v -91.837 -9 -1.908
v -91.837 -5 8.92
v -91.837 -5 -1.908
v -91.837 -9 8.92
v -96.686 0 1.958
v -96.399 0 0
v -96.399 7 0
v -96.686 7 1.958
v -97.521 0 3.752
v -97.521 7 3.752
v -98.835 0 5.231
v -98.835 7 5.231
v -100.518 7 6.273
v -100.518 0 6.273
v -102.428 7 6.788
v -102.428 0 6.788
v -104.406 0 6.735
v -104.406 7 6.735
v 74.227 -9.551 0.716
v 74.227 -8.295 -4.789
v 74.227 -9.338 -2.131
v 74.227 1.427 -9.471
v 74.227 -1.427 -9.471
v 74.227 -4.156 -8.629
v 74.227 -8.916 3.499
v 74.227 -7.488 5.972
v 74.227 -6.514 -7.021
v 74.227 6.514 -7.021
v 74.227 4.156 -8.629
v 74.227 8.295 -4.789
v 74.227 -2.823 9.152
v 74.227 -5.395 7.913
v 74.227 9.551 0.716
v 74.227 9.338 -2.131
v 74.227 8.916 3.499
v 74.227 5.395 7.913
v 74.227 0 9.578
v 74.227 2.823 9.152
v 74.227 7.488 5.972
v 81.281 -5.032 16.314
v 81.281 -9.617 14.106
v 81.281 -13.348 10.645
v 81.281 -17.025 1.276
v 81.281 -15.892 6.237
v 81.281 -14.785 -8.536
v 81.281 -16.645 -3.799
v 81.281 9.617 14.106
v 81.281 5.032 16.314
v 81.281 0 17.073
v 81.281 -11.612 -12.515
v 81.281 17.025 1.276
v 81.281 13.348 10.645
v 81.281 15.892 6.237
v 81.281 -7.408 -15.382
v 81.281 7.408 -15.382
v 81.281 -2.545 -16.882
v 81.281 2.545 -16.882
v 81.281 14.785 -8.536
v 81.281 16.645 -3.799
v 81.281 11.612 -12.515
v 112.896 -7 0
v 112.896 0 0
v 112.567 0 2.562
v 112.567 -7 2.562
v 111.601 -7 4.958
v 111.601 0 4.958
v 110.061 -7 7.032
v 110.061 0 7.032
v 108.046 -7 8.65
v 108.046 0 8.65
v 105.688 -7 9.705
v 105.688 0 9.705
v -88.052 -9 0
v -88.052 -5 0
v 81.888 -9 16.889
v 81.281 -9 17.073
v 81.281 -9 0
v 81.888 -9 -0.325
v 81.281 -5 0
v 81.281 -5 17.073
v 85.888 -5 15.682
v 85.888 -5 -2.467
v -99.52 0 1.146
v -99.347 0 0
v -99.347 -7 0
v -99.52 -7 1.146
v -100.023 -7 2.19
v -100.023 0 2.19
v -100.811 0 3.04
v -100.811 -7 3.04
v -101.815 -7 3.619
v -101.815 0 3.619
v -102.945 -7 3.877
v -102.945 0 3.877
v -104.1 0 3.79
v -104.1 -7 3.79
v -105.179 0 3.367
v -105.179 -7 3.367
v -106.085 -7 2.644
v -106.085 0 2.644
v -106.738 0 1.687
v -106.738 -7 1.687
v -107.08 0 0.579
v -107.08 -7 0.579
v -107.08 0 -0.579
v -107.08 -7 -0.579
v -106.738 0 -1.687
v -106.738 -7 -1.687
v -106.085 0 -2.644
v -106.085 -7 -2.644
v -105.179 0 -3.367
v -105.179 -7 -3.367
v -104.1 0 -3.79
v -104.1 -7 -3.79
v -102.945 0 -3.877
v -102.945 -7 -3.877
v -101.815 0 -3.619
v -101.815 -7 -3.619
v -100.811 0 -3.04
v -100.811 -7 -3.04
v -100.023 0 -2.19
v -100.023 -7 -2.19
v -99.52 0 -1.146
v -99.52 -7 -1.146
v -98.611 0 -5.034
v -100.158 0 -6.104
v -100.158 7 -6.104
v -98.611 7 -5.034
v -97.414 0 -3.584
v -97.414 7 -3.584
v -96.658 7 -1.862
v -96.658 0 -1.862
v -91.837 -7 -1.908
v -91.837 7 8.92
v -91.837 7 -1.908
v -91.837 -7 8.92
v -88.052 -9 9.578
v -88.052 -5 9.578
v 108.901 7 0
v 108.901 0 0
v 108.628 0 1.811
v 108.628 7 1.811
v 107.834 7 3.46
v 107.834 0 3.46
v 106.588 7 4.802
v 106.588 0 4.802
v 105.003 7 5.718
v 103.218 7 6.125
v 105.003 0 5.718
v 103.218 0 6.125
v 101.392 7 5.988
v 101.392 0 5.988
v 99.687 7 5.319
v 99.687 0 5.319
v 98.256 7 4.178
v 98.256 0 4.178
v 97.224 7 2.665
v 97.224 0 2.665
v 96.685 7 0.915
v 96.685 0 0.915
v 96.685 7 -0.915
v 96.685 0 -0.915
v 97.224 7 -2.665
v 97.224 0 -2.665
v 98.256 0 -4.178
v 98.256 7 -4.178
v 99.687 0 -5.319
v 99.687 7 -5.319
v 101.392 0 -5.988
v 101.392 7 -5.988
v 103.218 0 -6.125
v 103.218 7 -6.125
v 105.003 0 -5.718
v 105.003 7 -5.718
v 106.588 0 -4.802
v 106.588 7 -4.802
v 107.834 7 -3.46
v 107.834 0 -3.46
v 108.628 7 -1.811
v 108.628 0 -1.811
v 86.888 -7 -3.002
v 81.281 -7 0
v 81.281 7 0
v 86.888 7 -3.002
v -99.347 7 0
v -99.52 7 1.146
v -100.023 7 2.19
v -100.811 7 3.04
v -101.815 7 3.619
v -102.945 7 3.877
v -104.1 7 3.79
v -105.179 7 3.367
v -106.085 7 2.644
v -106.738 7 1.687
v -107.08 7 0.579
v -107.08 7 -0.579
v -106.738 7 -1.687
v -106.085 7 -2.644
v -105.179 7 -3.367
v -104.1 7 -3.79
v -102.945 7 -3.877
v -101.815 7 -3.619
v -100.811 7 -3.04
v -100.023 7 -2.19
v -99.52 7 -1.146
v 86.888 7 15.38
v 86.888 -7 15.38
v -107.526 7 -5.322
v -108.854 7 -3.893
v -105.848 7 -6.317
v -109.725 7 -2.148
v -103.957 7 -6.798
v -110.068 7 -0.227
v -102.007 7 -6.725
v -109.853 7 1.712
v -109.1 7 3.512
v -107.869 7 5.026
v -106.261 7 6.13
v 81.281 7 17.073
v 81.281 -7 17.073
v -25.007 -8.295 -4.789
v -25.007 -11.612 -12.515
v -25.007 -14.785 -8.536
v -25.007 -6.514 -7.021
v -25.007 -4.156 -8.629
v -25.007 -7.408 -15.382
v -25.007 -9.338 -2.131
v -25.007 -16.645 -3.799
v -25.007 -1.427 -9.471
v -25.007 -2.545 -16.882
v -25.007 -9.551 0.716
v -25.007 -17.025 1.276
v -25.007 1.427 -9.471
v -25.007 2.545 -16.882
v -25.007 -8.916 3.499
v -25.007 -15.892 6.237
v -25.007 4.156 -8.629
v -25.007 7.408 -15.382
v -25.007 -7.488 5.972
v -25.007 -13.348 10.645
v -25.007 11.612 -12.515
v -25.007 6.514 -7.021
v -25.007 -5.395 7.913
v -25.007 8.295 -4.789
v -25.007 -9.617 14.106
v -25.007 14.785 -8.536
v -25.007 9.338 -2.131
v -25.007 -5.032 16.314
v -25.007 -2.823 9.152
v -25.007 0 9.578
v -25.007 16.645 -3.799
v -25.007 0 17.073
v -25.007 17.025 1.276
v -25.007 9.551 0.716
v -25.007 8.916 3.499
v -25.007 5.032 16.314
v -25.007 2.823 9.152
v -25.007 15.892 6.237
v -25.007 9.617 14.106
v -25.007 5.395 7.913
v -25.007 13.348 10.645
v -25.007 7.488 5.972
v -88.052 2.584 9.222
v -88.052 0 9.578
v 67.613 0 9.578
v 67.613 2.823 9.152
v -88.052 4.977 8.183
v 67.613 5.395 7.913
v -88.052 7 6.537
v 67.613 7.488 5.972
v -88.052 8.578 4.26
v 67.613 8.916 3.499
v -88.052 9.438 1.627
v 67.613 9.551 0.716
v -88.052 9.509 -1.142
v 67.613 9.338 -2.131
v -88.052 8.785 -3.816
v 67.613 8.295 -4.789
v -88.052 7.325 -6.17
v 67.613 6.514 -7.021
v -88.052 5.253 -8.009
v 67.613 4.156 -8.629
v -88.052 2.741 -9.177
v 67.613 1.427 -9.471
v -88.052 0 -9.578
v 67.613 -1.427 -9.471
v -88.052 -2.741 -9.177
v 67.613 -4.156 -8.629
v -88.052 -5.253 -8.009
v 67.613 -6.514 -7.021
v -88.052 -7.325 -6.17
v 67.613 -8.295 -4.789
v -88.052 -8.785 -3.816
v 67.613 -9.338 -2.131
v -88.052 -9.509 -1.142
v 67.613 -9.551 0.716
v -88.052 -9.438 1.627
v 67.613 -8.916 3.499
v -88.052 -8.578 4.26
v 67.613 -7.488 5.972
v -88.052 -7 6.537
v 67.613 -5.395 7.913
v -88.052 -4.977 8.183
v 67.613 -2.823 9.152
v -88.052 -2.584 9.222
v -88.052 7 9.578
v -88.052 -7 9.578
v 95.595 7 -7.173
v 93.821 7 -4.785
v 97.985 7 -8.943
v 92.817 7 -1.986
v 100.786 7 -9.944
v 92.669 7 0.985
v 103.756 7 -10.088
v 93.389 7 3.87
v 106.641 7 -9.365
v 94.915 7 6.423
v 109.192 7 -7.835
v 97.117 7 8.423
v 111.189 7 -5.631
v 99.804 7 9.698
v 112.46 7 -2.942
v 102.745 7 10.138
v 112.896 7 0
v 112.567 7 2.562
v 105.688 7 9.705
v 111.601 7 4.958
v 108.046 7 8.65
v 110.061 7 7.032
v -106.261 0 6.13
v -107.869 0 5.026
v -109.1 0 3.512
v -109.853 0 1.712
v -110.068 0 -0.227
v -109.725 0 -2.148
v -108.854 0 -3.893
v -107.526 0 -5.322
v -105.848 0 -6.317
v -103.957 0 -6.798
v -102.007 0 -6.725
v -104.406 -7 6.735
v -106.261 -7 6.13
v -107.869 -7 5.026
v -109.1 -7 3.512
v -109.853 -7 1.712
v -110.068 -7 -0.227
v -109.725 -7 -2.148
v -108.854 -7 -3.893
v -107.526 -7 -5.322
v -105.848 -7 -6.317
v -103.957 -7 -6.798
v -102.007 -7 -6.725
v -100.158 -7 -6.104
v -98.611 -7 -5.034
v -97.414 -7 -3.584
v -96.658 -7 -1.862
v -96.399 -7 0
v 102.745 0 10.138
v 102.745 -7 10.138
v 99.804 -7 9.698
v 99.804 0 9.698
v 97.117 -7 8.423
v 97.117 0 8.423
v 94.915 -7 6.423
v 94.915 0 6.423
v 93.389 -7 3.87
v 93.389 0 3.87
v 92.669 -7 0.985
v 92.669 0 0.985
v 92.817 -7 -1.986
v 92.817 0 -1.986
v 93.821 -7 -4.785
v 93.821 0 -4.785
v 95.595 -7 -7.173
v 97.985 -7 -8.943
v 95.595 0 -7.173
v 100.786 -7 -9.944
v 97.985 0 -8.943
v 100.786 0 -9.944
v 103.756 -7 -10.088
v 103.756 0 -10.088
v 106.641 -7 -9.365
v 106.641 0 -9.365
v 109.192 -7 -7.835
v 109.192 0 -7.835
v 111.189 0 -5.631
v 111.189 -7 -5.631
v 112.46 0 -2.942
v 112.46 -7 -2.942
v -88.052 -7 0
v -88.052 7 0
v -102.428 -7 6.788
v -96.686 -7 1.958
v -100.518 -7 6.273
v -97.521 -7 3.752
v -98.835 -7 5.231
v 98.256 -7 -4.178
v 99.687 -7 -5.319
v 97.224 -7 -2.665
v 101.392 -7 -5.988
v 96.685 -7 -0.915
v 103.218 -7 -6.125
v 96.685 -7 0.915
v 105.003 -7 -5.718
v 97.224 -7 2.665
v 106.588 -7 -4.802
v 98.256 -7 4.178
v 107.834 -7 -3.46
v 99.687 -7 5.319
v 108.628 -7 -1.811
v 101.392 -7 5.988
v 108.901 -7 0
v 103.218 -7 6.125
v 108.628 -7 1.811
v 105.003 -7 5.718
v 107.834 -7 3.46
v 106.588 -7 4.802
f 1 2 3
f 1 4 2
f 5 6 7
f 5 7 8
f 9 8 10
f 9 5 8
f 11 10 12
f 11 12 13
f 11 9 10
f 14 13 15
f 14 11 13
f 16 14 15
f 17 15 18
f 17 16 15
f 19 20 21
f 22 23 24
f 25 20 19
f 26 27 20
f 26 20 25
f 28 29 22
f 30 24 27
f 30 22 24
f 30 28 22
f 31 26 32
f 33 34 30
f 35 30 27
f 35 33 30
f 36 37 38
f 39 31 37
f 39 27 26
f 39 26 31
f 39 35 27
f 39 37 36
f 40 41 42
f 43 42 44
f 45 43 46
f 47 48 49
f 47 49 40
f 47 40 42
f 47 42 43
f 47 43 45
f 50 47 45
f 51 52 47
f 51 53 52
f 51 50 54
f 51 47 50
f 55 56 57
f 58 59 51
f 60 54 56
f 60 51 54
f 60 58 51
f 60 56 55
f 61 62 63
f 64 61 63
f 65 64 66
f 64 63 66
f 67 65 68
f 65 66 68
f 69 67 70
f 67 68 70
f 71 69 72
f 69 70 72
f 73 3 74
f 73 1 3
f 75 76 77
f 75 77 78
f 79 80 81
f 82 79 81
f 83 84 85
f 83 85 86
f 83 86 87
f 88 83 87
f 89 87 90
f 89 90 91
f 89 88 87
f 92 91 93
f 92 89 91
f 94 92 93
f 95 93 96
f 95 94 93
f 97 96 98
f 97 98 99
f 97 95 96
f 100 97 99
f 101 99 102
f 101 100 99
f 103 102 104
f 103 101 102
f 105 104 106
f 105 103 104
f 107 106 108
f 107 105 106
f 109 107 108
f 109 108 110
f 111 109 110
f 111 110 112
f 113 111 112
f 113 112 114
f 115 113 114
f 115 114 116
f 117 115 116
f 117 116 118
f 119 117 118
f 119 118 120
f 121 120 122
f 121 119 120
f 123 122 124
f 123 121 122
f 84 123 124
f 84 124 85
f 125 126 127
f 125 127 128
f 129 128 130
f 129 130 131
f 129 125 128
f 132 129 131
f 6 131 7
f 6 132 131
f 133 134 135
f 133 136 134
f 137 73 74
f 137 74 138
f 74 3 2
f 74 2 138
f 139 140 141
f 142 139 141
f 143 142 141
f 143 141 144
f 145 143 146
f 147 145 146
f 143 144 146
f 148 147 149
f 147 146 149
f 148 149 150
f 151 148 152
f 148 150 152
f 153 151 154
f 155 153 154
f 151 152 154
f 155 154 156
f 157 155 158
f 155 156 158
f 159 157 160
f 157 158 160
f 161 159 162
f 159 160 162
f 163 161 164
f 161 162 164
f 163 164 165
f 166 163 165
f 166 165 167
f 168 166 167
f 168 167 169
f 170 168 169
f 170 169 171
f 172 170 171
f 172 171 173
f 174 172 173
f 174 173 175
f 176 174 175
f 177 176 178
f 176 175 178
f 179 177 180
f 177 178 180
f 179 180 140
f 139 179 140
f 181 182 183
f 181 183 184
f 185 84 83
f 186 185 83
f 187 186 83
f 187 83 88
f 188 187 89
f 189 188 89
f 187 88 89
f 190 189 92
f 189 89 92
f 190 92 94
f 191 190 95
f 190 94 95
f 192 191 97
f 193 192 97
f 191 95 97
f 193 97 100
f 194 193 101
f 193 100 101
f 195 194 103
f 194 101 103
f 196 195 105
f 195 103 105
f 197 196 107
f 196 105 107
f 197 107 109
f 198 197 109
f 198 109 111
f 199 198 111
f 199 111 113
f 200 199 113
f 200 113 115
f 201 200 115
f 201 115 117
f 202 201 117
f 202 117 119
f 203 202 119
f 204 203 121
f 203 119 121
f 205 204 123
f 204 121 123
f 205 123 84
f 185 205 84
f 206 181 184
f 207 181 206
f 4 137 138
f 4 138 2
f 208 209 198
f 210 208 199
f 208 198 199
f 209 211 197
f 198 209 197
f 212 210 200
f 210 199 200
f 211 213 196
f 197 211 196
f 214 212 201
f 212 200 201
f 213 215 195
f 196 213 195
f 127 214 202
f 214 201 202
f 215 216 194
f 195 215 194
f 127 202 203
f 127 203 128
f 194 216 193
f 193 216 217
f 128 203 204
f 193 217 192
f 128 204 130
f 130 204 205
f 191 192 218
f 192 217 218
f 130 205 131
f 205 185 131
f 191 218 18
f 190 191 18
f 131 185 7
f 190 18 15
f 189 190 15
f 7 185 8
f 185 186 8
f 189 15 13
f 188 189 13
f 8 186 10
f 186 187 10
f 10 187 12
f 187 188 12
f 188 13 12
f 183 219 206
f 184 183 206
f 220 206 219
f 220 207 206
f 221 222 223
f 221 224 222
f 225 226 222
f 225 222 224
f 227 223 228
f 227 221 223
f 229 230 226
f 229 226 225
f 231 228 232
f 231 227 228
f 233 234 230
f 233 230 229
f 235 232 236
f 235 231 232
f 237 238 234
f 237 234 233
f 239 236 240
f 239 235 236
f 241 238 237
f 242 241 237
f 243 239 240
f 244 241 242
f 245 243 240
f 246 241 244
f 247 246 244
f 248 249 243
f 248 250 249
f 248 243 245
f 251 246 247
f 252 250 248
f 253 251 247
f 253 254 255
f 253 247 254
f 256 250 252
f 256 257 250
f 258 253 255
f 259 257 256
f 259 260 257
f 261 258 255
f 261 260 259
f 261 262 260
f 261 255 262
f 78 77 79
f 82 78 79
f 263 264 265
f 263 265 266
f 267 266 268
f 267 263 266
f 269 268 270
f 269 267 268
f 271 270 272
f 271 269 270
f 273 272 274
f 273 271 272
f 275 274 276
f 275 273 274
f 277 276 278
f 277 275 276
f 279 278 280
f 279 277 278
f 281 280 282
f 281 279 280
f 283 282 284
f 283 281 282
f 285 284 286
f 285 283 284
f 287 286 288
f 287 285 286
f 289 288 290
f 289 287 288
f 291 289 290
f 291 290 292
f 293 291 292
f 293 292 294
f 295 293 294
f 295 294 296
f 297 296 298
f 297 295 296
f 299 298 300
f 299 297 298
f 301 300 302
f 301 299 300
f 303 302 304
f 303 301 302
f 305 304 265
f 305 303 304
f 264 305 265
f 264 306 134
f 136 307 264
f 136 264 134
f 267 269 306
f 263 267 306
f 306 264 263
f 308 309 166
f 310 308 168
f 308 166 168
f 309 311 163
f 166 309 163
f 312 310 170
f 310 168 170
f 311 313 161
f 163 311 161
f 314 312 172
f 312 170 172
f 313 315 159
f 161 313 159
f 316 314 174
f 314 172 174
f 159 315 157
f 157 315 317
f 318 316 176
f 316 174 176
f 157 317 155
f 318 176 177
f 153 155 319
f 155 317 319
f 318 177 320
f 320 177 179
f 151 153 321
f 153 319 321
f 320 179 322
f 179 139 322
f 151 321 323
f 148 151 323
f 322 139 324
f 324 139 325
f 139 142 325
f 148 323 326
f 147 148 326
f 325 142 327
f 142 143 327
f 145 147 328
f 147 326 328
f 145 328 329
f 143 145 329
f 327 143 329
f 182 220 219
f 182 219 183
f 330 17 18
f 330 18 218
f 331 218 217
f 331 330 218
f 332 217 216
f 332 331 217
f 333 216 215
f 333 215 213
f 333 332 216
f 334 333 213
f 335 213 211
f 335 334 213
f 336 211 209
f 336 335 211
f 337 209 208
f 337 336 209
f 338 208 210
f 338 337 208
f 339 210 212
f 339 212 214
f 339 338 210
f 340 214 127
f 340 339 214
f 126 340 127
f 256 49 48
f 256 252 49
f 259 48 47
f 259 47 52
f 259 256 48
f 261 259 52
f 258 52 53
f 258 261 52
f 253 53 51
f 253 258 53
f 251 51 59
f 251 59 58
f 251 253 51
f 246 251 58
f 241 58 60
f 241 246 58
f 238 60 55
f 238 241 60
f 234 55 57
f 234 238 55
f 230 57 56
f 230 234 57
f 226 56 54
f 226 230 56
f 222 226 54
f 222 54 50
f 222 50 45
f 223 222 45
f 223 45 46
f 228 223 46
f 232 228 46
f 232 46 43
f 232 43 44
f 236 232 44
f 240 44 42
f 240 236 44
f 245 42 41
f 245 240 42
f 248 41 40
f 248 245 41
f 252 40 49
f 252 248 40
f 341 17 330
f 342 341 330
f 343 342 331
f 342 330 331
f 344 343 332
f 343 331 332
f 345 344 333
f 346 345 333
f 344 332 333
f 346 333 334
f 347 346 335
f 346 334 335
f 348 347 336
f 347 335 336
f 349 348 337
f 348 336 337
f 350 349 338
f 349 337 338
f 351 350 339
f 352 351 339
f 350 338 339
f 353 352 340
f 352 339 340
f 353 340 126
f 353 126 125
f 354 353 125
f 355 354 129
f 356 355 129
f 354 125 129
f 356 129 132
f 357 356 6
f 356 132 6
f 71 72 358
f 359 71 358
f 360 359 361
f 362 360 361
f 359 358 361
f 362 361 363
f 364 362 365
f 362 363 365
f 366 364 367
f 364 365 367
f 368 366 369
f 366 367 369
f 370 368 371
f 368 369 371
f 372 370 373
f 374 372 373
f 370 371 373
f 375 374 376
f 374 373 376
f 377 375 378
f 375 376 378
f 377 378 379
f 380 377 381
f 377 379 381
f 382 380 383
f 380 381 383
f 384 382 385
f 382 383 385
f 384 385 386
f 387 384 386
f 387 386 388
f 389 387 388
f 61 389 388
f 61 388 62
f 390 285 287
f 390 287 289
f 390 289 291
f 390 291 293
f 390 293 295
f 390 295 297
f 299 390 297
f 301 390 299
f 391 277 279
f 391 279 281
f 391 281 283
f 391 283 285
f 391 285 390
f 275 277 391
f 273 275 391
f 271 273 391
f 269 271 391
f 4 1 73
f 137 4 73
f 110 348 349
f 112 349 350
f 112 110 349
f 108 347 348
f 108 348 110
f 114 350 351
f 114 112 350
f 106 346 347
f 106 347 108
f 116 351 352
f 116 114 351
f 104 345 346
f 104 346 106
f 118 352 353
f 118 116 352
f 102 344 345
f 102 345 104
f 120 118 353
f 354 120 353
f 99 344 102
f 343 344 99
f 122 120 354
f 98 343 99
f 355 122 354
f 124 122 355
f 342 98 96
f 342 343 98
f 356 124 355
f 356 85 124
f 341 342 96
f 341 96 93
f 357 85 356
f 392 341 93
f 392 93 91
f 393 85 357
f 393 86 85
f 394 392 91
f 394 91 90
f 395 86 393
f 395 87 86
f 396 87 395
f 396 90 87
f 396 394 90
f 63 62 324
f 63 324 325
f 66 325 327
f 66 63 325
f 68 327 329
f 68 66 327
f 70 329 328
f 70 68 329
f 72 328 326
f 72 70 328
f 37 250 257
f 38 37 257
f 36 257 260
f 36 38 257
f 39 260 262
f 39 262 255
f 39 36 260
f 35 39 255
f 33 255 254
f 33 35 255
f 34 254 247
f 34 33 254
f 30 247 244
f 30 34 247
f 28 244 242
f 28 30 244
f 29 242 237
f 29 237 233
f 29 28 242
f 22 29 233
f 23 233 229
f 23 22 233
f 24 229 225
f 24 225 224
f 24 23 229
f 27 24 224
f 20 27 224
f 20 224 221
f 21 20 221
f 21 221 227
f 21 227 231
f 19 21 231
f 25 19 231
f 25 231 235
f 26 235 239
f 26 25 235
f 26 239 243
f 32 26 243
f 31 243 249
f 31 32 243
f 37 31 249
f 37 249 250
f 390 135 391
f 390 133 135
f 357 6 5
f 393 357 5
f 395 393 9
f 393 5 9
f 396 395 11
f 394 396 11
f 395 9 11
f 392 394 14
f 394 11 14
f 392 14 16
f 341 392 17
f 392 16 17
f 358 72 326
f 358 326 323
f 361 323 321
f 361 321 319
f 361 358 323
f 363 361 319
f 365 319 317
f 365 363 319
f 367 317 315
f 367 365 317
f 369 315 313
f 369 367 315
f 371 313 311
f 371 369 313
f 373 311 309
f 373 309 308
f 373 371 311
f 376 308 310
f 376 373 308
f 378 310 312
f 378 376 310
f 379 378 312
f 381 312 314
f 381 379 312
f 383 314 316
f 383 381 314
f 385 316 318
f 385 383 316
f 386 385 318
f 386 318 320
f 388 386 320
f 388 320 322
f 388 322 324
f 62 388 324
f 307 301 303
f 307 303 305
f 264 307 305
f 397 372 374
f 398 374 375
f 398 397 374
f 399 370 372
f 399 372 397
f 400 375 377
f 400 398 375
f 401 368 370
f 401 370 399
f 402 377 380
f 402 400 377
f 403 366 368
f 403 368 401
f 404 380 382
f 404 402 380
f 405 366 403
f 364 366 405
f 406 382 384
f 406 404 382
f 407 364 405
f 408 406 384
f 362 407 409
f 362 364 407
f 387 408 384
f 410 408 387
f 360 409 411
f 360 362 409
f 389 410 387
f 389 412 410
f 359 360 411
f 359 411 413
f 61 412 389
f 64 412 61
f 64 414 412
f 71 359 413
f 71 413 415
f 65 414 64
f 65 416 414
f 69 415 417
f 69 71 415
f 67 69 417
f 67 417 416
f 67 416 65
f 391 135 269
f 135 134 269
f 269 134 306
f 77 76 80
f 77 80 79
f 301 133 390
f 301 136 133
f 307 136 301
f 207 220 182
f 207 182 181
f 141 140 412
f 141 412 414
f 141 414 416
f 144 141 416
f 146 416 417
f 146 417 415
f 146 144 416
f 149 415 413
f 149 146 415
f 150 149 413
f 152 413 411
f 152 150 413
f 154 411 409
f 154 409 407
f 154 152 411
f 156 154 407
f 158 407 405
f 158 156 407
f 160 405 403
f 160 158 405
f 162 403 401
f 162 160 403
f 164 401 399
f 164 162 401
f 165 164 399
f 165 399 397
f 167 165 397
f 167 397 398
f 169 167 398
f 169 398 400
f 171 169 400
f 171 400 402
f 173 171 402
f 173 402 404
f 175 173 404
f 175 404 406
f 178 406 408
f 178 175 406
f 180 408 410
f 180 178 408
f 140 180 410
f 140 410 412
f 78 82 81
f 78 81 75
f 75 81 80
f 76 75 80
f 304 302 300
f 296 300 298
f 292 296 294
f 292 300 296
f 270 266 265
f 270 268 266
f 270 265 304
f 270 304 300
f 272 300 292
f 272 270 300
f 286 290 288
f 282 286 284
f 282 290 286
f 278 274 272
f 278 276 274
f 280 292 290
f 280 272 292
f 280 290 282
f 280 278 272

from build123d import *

# Parameters (mm, degrees)
F3_DEPTH    = 7
F0_R        = 3.8878640564
F0_R_2      = 6.1424275905
F4_DEPTH    = 2
F5_T1_DEPTH = 44.0991409969


# Not quite as in the source:
# - a fillet or chamfer that OpenCascade refuses, or shapes differently, is made with other operations: its cross-section is extruded or revolved along the edge and cut away or added


with BuildPart() as f1:
    # F0 (on Front) → F1 (revolve)
    with BuildSketch(Plane.XZ):
        Polygon((-25.0066287739, 17.072636364), (-25.0066287739, 9.5776912849), (67.6134303212, 9.5776912849), (74.2266178131, 9.5776912849), (74.2266178131, 0), (81.2806785107, 0), (81.2806785107, 17.072636364), align=None)
    revolve(axis=Axis((-10.2194553203, 0, 0), (-1, 0, 0)))


with BuildPart() as f2:
    # F0 (on Front) → F2 (revolve)
    with BuildSketch(Plane.XZ):
        Polygon((-88.0523409618, 9.5776912849), (-88.0523409618, 0), (67.6134303212, 0), (67.6134303212, 9.5776912849), (-25.0066287739, 9.5776912849), align=None)
    revolve(axis=Axis((-10.2194553203, 0, 0), (-1, 0, 0)))

    # F0 (on Front) → F3 (join, symmetric)
    with BuildSketch(Plane.XZ):
        Polygon((-91.8371824493, -1.9084735904), (-88.0523409618, 0), (-88.0523409618, 9.5776912849), (-91.8371824493, 8.9197958771), align=None)
    extrude(amount=F3_DEPTH, both=True)


with BuildPart() as f3:
    # F0 (on Front) → F3, piece 2 (new body, symmetric)
    with BuildSketch(Plane.XZ):
        with BuildLine():
            ThreePointArc((-104.4060712545, 6.7350242686), (-109.725277002, -2.1475884562), (-100.1575113171, -6.1039274712))
            ThreePointArc((-100.1575113171, -6.1039274712), (-97.4142233615, -3.5840521197), (-96.3993484931, 0))
            ThreePointArc((-96.3993484931, 0), (-98.8349018086, 5.2313516723), (-104.4060712545, 6.7350242686))
        make_face()
        with Locations((-103.2353639603, 0)):
            Circle(F0_R, mode=Mode.SUBTRACT)
    extrude(amount=F3_DEPTH, both=True)


with BuildPart() as f3b:
    # F0 (on Front) → F3, piece 3 (new body, symmetric)
    with BuildSketch(Plane.XZ):
        Polygon((86.8883872816, 15.3799332838), (81.2806785107, 17.072636364), (81.2806785107, 0), (86.8883872816, -3.0023778334), align=None)
    extrude(amount=F3_DEPTH, both=True)


with BuildPart() as f3c:
    # F0 (on Front) → F3, piece 4 (new body, symmetric)
    with BuildSketch(Plane.XZ):
        with BuildLine():
            ThreePointArc((112.8962301513, 0), (110.8970724106, 6.0445930034), (105.6880680425, 9.7051953777))
            ThreePointArc((105.6880680425, 9.7051953777), (93.3911995488, 3.8763654791), (97.9734557929, -8.9373443838))
            ThreePointArc((97.9734557929, -8.9373443838), (107.9673365894, -8.6972024121), (112.8962301513, 0))
        make_face()
        with Locations((102.7585268021, 0)):
            Circle(F0_R_2, mode=Mode.SUBTRACT)
    extrude(amount=F3_DEPTH, both=True)


with BuildPart() as f4:
    # F4 (new, symmetric): a face of the model
    f4_faces = [f3b.part.faces().sort_by_distance(p)[0] for p in [
        (84.1190568725, -7, 7.3480952717),
    ]]
    extrude(f4_faces, amount=F4_DEPTH, both=True)

    # F5: chamfer of 5 on 1 edges, made by hand

    # F5_s2 → F5_t1 (cut)
    with BuildSketch(Plane.XY.offset(-15.8607927732)):
        Polygon((86.8883872816, -4), (81.8883872816, -9), (86.8883872816, -9), align=None)
    extrude(amount=F5_T1_DEPTH, mode=Mode.SUBTRACT)


with BuildPart() as f4b:
    # F4#2 (new, symmetric): a face of the model
    f4_2_faces = [f2.part.faces().sort_by_distance(p)[0] for p in [
        (-89.9834206726, -7, 4.1341467443),
    ]]
    extrude(f4_2_faces, amount=F4_DEPTH, both=True)


solid = Compound([f1.part, f2.part, f3.part, f3b.part, f3c.part, f4.part, f4b.part])
